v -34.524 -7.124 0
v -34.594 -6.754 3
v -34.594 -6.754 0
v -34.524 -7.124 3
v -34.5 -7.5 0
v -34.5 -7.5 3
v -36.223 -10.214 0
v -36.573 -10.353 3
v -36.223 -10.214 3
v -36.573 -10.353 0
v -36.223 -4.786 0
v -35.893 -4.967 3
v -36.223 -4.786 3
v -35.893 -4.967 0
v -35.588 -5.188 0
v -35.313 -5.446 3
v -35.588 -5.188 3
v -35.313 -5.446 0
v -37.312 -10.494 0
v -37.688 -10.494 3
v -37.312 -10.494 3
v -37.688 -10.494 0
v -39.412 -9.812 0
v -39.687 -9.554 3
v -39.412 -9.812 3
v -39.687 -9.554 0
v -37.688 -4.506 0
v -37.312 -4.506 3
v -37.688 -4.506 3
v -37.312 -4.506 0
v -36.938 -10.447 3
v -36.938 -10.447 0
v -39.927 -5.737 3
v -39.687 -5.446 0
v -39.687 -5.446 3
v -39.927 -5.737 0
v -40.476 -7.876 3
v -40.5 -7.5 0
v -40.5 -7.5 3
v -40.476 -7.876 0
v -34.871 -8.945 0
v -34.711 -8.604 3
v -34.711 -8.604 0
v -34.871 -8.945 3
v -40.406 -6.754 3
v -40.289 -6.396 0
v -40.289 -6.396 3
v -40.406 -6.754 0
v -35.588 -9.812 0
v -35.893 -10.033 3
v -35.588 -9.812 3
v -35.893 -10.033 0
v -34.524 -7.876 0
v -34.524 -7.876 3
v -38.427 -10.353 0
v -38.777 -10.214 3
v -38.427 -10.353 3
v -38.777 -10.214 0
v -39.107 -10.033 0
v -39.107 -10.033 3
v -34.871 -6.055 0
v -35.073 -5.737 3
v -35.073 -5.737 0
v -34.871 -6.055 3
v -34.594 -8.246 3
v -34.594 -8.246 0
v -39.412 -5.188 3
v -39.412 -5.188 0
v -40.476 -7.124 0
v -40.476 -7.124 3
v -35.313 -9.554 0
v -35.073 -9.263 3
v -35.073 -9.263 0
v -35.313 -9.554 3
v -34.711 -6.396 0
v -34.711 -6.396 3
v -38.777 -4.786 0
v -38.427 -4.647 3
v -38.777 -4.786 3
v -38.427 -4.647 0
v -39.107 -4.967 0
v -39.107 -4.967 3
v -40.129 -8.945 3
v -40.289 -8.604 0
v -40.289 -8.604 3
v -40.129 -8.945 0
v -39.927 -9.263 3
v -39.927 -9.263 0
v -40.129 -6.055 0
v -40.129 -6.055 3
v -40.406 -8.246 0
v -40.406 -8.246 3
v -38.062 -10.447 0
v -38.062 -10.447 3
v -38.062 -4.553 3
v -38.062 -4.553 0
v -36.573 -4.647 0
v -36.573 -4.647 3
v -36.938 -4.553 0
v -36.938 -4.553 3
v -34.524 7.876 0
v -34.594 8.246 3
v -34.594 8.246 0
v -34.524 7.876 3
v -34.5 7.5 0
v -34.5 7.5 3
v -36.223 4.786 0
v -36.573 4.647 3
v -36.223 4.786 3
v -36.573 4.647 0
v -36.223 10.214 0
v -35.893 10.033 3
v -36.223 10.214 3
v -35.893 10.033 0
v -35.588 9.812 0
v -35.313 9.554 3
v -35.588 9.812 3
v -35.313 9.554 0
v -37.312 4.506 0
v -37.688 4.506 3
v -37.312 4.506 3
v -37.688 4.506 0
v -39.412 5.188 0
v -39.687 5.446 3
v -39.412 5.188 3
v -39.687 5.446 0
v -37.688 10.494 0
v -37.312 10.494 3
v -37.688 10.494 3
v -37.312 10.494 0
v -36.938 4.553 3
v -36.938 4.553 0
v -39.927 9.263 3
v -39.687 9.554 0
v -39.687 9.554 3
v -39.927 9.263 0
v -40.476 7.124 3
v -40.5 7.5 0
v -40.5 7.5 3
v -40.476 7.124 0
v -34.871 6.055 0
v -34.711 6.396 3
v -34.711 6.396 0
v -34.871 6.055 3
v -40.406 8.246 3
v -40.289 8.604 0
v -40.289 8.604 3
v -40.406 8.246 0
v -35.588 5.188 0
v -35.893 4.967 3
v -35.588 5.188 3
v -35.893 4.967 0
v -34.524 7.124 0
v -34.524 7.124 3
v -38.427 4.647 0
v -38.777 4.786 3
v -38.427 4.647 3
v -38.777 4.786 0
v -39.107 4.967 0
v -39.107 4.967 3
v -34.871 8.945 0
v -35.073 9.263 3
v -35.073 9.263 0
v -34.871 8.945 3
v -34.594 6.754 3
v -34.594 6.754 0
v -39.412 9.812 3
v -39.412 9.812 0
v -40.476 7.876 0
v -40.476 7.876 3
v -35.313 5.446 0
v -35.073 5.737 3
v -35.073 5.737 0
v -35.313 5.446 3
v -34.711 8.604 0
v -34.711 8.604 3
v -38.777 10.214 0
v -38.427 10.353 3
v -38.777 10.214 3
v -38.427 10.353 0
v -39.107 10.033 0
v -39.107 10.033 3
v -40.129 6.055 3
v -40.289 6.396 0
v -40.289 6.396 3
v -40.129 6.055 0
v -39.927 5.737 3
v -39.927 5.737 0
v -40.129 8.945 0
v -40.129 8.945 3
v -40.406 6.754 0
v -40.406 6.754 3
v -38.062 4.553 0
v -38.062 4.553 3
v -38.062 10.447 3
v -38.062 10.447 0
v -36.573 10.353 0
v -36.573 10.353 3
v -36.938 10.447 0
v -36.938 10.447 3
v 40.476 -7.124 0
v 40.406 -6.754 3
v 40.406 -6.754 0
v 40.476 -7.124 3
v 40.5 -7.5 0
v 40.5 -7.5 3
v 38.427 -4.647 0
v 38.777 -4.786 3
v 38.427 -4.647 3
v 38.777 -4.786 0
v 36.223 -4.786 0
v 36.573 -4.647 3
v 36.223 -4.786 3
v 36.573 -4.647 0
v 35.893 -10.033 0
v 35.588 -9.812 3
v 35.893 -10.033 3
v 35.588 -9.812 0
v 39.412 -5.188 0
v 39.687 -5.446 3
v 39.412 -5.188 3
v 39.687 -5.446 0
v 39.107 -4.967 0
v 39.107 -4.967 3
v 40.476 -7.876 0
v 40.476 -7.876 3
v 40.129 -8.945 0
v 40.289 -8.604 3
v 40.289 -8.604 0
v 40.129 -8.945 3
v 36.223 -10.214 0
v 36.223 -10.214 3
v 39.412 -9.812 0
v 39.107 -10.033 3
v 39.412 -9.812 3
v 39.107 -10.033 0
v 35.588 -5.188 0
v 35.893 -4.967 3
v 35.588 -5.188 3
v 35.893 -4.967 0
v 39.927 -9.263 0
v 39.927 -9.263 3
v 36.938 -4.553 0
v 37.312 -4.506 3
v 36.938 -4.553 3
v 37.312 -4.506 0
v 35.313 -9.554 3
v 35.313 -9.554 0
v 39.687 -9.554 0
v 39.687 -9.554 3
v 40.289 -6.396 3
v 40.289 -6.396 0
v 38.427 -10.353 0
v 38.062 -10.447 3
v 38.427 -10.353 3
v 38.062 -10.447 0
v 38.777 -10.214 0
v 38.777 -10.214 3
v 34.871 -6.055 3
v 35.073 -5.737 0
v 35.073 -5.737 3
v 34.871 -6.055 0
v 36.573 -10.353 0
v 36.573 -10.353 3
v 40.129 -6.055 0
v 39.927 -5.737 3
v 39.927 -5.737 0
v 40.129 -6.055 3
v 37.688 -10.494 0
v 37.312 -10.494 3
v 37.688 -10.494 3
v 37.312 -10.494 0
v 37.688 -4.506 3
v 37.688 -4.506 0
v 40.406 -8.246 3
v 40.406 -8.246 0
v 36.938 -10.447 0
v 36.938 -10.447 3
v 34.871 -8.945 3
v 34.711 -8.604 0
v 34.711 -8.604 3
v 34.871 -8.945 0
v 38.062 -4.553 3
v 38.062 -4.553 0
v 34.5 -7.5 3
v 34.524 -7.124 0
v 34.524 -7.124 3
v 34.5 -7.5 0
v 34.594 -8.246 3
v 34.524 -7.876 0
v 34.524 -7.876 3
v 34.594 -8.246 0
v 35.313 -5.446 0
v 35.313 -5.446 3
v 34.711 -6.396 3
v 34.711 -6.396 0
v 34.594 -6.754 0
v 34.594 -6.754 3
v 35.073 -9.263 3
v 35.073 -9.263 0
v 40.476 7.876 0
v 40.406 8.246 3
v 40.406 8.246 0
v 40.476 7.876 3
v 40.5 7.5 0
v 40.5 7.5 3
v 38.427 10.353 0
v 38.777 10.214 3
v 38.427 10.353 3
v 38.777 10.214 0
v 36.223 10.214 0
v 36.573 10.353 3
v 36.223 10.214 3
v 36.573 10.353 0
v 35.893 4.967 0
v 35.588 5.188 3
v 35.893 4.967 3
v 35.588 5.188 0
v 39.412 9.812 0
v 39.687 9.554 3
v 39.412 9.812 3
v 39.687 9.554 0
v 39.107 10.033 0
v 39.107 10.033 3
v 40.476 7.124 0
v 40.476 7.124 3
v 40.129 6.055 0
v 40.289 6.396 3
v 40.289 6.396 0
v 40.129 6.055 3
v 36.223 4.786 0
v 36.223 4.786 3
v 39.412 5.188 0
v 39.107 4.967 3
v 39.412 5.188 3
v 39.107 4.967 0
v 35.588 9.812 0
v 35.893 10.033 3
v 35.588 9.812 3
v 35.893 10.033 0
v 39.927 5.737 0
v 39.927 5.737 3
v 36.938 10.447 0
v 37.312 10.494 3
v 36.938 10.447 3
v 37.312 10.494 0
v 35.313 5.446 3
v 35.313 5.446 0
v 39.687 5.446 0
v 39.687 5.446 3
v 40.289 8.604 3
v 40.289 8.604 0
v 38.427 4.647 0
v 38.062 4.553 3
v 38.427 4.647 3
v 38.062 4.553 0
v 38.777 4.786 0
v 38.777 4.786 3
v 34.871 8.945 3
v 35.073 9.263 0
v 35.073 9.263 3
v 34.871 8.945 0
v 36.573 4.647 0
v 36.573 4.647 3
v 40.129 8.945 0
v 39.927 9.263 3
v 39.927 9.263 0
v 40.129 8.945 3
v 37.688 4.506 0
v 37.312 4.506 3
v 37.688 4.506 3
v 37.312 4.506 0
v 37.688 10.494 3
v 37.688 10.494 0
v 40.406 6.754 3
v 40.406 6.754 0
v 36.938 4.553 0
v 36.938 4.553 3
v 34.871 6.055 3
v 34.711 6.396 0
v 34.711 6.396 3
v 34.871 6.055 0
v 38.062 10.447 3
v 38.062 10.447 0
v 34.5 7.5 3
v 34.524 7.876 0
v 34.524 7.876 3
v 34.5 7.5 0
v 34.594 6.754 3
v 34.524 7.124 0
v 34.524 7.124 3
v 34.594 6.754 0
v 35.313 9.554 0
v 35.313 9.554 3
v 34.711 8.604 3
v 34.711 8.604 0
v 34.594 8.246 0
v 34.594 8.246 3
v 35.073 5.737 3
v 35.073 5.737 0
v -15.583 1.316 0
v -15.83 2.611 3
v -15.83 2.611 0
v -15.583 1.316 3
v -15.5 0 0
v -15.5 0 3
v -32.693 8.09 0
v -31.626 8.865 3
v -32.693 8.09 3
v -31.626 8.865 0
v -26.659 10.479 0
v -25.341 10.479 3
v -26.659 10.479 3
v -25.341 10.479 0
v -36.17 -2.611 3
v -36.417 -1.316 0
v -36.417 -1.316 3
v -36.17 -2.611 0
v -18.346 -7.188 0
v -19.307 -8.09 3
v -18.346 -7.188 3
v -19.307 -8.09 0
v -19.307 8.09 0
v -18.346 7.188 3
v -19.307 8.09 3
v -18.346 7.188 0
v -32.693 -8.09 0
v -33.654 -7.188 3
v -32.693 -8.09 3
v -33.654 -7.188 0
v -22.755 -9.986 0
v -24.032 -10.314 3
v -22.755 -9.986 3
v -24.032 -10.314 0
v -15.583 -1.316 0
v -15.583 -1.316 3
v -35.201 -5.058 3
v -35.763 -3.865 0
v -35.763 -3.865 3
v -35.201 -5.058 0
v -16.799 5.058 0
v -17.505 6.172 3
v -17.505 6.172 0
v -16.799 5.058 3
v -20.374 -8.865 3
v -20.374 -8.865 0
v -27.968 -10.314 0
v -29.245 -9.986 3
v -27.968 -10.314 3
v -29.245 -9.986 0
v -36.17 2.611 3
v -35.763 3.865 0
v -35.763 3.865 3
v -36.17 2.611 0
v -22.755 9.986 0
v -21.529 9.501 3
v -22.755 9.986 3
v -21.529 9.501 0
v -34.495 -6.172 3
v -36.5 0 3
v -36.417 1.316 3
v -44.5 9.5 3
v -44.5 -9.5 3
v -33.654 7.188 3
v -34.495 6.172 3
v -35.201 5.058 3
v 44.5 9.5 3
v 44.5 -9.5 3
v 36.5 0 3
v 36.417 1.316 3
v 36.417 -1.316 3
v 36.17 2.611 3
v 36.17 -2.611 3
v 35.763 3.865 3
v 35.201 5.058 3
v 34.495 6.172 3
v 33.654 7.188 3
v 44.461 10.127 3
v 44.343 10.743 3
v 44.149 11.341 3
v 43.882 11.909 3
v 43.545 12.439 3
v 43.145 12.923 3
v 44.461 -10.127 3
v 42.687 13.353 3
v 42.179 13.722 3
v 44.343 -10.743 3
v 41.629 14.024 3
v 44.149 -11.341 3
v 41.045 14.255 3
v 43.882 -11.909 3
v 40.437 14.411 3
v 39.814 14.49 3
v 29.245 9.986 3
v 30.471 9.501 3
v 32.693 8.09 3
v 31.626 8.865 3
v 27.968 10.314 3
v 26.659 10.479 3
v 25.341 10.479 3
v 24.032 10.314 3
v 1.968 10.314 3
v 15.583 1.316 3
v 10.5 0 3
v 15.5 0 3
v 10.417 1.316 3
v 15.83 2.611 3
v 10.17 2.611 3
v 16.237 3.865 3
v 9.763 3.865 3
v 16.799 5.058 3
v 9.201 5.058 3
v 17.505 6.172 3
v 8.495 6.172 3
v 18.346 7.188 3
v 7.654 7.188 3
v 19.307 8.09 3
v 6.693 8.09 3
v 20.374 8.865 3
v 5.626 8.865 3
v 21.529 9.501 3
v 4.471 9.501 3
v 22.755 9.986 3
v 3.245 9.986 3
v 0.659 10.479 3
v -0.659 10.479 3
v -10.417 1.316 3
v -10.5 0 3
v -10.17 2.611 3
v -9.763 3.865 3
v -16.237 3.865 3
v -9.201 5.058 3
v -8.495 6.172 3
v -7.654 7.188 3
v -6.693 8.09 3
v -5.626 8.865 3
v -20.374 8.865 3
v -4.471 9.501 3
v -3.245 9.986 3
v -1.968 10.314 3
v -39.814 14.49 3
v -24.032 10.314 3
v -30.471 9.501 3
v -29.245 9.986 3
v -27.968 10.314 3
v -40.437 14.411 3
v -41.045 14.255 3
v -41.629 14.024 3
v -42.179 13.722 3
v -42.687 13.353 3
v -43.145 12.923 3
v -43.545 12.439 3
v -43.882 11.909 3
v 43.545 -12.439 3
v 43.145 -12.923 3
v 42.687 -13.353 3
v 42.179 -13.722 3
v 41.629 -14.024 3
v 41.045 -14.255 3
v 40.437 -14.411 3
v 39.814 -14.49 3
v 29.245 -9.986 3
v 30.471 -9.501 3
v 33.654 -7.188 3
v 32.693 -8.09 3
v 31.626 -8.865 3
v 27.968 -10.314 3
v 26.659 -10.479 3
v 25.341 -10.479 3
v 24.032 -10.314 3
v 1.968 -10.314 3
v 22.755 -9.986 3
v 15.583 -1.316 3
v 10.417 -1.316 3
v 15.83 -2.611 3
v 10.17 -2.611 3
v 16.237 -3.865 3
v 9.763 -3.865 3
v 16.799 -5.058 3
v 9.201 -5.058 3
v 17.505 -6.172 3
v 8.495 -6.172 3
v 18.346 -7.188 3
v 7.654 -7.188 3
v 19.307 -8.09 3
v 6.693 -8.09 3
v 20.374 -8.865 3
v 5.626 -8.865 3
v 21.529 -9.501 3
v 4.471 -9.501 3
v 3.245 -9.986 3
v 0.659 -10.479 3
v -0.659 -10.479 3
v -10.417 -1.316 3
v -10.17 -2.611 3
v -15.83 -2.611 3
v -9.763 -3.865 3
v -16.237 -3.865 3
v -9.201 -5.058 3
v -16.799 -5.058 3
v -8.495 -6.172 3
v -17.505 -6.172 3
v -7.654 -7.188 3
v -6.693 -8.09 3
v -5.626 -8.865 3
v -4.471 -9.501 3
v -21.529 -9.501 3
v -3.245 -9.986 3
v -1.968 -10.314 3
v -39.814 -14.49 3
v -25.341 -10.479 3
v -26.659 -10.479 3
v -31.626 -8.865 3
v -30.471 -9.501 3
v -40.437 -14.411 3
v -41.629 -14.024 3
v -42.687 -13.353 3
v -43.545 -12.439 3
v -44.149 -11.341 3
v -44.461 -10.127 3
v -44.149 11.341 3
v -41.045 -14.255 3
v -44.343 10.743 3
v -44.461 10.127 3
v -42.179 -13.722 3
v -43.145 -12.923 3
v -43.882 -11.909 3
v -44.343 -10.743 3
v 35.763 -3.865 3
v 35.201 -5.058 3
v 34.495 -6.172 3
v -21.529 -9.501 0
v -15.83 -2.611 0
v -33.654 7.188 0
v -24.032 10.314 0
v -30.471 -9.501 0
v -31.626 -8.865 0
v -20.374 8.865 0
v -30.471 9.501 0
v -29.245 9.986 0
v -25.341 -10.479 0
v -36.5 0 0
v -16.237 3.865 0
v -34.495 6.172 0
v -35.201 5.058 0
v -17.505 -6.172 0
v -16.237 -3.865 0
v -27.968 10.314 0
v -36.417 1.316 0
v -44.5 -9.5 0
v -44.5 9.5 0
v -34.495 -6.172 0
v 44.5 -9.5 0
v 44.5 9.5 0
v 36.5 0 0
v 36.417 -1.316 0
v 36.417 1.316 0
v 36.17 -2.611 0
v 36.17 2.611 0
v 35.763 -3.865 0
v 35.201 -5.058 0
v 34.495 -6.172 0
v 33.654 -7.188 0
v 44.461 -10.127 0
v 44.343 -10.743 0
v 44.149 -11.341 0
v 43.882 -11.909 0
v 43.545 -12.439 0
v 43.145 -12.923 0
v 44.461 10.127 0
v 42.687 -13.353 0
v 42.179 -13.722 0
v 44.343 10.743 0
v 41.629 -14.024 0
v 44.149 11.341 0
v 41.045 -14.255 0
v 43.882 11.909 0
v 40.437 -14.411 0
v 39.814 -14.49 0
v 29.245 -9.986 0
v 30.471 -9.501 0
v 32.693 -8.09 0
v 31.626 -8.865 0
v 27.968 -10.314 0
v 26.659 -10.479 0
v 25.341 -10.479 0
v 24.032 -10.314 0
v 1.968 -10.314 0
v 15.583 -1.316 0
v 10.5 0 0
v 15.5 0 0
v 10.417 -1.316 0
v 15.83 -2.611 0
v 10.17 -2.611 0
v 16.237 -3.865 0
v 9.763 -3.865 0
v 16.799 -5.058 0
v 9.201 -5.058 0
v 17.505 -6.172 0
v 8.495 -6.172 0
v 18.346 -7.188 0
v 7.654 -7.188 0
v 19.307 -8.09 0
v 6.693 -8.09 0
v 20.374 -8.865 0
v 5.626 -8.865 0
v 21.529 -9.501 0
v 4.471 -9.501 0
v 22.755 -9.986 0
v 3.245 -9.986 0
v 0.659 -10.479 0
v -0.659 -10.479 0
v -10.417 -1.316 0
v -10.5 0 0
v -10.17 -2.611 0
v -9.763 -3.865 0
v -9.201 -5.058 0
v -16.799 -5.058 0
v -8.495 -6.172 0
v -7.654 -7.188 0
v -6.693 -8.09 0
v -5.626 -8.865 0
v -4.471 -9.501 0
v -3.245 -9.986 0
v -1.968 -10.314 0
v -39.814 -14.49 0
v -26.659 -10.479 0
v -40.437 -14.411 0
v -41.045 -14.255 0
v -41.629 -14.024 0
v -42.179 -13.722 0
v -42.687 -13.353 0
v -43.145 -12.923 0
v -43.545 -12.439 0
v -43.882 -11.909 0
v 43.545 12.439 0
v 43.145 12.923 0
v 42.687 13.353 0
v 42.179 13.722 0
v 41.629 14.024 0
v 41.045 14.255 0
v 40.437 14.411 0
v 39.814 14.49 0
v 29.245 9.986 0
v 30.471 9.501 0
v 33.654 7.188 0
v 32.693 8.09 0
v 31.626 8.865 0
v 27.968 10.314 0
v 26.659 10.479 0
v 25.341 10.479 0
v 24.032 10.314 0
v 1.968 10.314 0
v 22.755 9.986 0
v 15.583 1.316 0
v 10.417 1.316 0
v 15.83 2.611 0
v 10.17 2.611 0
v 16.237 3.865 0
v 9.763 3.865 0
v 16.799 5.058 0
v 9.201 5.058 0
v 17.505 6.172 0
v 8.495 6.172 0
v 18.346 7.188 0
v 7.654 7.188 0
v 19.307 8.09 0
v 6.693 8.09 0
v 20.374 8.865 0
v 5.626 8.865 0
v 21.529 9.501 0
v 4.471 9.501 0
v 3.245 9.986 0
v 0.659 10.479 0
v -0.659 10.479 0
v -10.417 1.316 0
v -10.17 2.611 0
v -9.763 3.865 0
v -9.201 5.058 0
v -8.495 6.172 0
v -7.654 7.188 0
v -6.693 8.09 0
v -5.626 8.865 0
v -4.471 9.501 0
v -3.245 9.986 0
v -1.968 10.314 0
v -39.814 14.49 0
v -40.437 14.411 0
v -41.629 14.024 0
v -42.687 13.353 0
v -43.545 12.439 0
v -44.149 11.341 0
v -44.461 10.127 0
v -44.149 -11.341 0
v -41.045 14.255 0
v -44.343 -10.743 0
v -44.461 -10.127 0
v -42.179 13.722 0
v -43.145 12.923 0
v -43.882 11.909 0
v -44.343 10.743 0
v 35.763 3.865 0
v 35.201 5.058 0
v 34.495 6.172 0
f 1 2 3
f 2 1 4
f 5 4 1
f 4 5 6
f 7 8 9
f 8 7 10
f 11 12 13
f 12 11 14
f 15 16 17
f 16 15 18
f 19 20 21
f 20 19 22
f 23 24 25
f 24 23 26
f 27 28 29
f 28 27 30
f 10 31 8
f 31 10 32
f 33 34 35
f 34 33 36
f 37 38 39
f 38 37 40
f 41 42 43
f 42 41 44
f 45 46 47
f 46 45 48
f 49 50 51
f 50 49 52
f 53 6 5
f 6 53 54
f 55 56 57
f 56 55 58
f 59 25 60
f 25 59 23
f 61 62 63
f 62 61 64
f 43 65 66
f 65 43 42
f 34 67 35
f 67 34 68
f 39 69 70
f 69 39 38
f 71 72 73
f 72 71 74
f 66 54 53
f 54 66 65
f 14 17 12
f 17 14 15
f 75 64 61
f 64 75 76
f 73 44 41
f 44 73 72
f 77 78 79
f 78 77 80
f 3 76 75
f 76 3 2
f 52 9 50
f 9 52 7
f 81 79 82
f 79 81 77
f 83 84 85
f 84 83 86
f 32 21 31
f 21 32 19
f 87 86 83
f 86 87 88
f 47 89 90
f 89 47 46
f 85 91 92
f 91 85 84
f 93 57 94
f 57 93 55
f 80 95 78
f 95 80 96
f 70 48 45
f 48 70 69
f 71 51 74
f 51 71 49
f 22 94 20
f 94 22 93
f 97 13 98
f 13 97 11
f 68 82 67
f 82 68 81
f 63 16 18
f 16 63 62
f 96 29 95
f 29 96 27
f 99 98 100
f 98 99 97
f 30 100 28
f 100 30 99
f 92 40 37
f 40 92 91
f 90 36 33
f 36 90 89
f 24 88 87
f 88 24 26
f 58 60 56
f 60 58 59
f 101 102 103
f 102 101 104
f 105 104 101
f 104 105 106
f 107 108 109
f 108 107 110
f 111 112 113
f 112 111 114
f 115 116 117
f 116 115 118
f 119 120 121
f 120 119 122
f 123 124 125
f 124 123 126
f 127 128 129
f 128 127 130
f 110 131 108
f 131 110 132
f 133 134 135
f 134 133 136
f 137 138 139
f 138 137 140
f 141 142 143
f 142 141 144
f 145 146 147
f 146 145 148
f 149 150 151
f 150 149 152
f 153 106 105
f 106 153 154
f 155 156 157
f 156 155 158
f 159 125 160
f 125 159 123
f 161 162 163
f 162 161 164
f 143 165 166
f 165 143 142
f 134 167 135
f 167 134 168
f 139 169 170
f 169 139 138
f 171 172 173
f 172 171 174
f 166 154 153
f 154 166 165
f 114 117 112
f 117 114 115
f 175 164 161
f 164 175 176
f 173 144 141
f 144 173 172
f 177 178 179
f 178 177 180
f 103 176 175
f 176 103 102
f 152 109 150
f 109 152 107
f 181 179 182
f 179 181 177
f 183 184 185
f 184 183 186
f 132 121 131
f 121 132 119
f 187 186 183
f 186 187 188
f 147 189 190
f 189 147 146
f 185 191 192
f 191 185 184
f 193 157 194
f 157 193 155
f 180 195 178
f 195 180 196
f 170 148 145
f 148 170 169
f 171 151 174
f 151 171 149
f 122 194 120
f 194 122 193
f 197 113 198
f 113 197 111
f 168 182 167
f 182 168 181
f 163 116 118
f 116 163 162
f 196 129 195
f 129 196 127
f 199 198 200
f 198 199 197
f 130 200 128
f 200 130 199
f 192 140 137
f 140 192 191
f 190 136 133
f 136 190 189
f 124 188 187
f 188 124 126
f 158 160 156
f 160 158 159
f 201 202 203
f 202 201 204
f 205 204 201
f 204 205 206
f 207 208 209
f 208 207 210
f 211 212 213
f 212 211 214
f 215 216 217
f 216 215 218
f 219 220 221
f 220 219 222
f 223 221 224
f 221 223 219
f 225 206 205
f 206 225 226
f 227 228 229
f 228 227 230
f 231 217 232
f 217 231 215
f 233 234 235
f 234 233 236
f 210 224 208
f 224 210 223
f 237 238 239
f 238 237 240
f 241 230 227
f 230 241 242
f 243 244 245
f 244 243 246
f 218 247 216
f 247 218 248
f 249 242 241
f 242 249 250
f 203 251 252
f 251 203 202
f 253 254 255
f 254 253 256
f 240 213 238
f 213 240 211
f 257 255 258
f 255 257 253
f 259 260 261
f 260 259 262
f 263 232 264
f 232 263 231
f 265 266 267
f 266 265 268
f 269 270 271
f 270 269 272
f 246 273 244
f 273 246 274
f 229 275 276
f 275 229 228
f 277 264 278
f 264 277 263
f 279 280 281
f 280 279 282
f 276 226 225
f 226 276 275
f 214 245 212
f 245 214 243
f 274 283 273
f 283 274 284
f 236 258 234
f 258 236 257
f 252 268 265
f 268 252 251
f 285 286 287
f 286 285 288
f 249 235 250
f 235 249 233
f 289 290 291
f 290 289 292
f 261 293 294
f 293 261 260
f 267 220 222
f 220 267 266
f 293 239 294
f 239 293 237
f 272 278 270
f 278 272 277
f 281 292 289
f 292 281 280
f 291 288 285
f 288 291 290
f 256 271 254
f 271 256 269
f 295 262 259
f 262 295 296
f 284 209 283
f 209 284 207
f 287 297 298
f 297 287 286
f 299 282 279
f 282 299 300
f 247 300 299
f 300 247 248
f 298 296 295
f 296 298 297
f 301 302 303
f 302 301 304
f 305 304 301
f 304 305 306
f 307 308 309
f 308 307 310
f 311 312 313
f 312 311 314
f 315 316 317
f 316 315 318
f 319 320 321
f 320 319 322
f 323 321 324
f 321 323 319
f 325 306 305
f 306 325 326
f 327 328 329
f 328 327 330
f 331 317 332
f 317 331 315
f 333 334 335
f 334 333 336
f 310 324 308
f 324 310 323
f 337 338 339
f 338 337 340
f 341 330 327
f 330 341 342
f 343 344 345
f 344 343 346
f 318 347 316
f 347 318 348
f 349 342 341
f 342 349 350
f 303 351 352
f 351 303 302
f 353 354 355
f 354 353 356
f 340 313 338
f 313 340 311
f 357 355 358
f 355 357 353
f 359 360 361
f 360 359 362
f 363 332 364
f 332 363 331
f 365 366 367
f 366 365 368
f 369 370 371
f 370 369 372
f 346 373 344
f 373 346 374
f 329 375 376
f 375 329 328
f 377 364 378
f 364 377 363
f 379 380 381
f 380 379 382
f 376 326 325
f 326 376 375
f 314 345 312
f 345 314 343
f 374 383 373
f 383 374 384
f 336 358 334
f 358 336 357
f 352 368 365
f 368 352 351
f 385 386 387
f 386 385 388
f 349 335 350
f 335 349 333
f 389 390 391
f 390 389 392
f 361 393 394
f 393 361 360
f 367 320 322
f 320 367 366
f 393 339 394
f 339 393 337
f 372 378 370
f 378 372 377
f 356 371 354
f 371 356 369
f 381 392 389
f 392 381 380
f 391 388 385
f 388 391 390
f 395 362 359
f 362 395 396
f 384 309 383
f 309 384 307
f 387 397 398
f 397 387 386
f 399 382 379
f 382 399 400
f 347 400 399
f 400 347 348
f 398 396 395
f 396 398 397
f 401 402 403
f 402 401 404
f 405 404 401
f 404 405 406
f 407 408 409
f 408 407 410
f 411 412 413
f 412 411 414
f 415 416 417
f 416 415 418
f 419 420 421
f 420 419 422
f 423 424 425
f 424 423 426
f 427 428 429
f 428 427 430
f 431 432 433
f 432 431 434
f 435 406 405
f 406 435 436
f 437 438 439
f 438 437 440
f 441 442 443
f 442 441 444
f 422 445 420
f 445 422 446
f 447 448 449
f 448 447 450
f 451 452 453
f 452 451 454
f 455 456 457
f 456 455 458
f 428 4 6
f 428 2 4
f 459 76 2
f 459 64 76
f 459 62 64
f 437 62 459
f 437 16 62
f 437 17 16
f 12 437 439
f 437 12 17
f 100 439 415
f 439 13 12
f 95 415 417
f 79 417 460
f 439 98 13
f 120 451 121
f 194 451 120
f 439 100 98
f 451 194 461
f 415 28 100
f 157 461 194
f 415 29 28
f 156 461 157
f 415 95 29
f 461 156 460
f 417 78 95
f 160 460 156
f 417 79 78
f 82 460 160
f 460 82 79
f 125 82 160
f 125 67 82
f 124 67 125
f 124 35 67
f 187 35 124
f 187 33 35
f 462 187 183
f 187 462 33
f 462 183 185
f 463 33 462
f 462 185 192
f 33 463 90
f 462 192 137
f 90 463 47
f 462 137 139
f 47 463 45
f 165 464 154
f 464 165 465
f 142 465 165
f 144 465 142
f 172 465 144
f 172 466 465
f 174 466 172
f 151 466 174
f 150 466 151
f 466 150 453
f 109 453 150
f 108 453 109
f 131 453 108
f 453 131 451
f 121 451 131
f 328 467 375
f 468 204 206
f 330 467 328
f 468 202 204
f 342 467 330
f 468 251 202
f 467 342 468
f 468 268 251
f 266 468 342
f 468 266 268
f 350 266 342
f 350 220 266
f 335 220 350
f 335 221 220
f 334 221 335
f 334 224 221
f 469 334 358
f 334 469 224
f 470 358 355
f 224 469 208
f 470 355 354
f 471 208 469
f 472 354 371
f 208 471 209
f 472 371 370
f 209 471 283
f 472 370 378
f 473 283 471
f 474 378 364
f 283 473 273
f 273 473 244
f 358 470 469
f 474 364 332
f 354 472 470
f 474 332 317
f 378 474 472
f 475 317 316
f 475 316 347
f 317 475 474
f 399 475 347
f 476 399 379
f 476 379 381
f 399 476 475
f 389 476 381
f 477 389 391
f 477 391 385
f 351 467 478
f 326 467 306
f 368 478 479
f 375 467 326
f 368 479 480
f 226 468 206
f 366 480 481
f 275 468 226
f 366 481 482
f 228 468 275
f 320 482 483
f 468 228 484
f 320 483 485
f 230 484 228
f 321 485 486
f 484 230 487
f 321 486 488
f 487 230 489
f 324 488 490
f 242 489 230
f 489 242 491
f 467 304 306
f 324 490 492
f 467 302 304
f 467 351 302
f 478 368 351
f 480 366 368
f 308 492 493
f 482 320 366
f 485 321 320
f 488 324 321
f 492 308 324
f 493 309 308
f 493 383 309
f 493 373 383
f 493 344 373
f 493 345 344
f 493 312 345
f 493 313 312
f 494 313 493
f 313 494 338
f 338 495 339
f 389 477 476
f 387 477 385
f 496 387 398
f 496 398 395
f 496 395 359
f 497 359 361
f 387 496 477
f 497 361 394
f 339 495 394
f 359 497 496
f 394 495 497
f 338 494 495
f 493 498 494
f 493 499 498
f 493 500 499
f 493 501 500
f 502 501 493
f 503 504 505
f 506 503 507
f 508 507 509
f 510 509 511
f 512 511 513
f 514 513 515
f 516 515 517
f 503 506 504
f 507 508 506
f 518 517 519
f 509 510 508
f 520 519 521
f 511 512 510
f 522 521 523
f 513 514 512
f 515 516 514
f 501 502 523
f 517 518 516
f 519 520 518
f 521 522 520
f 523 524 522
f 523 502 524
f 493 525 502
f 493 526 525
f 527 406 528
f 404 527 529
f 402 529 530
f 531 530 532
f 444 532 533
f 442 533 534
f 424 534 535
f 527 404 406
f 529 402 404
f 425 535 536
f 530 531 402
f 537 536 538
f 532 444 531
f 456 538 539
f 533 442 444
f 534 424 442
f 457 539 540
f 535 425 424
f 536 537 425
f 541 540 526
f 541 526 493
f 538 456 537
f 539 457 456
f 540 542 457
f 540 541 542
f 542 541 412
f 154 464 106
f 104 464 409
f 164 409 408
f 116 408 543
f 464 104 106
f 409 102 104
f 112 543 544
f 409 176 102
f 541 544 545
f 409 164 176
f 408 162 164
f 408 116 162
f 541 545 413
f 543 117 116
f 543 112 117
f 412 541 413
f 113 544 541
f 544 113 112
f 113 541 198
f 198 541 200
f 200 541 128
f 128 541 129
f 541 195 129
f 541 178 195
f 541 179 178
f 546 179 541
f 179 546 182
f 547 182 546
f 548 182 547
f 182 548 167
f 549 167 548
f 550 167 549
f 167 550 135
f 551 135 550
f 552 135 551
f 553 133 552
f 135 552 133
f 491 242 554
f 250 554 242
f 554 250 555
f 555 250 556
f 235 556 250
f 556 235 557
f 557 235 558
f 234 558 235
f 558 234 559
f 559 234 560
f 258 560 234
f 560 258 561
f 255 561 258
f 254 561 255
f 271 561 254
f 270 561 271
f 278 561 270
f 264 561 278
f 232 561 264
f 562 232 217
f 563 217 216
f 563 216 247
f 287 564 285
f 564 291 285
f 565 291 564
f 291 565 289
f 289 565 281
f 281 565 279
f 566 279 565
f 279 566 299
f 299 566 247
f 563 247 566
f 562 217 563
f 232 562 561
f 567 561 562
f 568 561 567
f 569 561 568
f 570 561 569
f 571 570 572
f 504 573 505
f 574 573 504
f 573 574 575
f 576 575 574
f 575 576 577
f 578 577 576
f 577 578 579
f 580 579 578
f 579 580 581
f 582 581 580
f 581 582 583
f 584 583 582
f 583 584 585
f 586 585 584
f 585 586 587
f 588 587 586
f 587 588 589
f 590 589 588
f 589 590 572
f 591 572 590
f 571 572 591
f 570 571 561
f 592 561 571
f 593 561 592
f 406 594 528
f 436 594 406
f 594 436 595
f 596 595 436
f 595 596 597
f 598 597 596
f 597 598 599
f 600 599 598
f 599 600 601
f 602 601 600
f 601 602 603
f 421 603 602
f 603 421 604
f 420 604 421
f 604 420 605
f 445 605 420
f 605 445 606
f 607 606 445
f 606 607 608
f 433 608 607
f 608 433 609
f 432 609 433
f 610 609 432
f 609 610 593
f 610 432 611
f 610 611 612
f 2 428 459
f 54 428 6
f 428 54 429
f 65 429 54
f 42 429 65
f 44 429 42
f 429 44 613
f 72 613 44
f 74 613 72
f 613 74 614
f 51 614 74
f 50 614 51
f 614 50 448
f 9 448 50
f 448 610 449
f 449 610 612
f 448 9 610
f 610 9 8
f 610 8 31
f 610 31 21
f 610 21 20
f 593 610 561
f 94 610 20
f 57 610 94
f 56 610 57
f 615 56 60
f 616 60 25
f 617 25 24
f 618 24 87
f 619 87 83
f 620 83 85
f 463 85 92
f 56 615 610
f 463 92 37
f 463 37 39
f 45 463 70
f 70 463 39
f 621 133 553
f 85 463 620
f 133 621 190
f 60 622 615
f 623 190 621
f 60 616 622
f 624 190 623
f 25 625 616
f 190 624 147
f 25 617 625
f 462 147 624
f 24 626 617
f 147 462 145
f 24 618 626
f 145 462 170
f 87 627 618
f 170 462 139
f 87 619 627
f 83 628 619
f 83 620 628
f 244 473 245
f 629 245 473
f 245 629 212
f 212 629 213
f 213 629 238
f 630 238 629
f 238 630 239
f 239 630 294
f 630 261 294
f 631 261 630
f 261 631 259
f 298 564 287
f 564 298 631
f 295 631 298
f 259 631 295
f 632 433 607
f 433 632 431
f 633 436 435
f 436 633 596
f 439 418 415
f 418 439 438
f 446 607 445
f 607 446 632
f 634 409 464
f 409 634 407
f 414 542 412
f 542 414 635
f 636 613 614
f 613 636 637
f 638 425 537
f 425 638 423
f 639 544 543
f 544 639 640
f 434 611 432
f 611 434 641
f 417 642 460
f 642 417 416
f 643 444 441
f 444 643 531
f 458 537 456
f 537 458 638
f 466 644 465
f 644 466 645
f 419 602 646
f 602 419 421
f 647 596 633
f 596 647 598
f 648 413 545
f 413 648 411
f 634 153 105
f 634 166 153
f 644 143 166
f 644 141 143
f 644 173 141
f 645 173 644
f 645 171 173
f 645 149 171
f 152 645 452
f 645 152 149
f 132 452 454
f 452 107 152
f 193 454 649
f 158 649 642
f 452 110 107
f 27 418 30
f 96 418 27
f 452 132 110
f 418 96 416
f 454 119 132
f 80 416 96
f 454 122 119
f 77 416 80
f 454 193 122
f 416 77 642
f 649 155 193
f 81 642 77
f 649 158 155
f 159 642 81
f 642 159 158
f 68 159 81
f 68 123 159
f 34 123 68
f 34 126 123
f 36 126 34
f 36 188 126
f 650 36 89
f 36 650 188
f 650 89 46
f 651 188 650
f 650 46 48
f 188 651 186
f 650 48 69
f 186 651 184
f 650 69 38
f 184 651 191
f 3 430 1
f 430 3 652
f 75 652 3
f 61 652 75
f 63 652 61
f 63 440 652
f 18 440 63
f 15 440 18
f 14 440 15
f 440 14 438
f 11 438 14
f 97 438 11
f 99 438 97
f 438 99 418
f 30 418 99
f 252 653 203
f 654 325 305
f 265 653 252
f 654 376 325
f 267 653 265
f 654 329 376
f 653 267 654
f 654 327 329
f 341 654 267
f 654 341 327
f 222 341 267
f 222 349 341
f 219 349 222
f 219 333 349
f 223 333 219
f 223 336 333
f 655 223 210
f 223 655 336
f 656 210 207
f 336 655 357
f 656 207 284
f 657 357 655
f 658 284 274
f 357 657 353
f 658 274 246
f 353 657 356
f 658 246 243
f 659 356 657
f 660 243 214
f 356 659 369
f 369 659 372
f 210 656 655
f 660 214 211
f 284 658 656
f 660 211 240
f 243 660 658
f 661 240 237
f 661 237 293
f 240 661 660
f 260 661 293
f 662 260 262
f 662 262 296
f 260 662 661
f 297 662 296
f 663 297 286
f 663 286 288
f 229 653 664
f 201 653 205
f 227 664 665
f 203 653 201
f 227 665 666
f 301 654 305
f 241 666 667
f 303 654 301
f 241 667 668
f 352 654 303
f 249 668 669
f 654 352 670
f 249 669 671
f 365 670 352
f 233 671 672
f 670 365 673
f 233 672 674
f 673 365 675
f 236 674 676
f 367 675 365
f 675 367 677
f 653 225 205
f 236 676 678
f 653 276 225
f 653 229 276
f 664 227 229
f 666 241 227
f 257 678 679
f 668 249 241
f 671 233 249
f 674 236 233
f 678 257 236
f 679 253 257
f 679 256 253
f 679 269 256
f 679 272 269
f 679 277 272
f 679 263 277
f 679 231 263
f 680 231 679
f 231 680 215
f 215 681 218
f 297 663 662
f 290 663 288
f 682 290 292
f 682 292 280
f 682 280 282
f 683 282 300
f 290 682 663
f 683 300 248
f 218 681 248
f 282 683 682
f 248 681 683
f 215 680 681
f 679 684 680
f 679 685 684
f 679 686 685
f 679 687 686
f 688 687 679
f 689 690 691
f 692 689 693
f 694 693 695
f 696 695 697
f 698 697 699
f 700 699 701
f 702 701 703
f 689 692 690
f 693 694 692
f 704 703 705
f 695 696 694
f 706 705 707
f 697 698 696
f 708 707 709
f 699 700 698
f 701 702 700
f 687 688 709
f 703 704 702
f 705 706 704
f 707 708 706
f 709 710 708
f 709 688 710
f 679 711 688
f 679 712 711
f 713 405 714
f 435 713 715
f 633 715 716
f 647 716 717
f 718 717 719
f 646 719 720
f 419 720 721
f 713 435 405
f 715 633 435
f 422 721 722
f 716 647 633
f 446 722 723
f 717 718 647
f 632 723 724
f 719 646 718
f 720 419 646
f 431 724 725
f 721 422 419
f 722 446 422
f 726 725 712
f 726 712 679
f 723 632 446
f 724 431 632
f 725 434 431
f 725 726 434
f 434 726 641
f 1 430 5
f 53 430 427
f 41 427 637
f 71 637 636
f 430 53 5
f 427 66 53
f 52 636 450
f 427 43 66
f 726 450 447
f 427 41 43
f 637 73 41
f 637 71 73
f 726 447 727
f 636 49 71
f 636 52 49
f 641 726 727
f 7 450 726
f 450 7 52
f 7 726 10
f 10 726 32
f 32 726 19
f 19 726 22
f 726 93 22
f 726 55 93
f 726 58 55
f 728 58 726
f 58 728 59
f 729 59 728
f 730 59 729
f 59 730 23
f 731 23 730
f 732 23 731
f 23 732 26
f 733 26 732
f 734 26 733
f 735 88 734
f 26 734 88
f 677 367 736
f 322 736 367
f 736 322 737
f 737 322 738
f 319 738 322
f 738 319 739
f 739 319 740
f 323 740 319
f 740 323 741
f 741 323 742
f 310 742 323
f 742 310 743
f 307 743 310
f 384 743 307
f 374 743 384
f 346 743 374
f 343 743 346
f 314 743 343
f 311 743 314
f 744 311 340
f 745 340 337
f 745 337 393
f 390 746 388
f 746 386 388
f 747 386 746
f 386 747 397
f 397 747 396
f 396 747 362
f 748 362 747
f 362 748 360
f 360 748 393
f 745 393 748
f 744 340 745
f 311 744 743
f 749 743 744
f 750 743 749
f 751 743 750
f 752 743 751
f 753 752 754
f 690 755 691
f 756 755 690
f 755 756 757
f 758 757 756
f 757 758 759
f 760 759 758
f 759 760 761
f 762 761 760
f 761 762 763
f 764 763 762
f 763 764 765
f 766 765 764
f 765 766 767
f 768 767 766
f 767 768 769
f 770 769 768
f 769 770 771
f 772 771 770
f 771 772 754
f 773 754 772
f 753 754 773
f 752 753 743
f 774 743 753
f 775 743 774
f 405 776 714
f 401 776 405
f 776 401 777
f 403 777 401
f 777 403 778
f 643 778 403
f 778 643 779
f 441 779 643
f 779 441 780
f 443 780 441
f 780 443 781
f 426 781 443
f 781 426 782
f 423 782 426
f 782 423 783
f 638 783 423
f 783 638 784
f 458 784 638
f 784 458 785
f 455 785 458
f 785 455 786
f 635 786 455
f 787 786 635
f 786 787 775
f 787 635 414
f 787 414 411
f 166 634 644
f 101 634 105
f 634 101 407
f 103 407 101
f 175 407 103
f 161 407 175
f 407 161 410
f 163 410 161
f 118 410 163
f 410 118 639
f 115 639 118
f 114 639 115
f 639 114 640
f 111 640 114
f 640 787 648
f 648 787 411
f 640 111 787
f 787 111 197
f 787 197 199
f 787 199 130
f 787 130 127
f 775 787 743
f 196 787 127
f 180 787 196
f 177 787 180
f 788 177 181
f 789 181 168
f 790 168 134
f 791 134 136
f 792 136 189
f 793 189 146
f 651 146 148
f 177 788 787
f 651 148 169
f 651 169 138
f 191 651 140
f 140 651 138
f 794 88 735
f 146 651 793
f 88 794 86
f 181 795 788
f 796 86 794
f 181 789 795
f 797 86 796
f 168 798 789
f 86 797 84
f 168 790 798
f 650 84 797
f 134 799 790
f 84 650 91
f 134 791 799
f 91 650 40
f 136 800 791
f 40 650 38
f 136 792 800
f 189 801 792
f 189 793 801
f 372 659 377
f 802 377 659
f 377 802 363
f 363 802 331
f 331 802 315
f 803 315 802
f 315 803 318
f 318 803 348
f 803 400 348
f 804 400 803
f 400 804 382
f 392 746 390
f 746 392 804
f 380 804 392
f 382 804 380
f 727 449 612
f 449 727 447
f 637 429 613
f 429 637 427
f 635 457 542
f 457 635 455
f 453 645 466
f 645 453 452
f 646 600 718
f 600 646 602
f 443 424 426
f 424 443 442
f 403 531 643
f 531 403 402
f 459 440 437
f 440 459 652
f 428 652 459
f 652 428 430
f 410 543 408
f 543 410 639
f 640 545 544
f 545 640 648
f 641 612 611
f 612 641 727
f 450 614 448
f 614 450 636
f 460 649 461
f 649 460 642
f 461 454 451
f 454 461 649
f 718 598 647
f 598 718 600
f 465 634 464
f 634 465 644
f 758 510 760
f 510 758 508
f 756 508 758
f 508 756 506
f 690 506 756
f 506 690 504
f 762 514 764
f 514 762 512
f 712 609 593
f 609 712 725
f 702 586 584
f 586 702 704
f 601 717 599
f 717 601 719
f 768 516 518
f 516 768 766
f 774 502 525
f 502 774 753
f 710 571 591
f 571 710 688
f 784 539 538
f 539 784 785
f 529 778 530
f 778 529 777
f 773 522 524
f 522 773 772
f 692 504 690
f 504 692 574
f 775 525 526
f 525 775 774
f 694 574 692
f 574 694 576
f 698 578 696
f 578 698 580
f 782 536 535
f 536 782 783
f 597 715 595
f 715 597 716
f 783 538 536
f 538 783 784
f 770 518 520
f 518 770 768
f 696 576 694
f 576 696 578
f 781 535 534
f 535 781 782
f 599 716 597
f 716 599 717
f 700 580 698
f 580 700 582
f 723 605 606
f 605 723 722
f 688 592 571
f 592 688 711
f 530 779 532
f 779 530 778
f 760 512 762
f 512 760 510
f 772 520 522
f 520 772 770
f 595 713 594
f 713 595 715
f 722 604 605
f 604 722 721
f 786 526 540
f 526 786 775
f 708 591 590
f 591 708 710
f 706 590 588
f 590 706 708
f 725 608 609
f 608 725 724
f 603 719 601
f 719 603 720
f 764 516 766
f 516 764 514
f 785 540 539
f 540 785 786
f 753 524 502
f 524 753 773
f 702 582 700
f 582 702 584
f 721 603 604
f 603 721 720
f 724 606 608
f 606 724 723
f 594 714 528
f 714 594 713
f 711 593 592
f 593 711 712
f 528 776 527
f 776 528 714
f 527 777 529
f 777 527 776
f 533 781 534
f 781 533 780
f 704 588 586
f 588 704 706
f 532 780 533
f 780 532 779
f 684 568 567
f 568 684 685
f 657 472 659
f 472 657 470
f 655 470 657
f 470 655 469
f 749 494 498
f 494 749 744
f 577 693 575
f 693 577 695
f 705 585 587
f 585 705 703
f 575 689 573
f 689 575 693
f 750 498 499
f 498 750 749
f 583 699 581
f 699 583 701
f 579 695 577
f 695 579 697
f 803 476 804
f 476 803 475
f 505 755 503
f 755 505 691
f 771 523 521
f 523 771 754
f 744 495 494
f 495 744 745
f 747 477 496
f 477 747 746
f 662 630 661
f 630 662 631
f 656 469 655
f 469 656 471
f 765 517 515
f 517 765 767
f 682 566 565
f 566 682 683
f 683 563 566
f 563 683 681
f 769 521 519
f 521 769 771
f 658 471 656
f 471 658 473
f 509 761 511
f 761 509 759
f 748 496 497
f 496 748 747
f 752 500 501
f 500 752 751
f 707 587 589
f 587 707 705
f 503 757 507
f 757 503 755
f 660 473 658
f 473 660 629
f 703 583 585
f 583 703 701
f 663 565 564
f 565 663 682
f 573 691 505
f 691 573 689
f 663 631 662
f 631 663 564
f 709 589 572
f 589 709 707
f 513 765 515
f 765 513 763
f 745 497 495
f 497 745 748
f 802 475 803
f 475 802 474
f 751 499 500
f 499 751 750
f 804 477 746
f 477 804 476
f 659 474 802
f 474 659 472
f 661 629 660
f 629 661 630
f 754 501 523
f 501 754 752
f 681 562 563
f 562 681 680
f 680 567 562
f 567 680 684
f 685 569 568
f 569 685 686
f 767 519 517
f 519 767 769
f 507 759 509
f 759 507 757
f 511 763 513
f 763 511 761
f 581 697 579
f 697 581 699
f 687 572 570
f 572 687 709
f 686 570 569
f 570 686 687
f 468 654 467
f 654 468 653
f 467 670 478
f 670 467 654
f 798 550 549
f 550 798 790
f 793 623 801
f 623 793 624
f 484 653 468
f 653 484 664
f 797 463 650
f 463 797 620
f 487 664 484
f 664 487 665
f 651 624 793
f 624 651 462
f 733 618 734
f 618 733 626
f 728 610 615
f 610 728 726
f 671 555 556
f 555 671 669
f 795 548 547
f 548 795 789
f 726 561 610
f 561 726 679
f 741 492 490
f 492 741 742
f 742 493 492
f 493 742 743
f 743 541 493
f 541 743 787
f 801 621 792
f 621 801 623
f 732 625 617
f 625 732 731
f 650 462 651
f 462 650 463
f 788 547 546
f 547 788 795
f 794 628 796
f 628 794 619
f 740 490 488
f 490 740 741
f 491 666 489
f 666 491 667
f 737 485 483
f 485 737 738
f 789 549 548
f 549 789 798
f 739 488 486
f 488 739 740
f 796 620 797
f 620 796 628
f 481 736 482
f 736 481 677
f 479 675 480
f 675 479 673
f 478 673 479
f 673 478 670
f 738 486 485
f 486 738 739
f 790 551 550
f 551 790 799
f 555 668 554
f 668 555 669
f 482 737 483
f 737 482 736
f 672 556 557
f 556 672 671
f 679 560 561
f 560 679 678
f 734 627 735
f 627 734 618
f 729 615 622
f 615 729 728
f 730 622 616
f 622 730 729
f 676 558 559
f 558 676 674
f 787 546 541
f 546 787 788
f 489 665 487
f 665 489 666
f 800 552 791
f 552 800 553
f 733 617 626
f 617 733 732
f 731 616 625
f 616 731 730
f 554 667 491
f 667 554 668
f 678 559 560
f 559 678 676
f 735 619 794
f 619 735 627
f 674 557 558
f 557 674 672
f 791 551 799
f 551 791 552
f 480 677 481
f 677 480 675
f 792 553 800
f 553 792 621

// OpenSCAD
$fn = 50;


difference() {
	union() {
		hull() {
			translate(v = [-39.5000000000, 9.5000000000, 0]) {
				cylinder(h = 3, r = 5);
			}
			translate(v = [39.5000000000, 9.5000000000, 0]) {
				cylinder(h = 3, r = 5);
			}
			translate(v = [-39.5000000000, -9.5000000000, 0]) {
				cylinder(h = 3, r = 5);
			}
			translate(v = [39.5000000000, -9.5000000000, 0]) {
				cylinder(h = 3, r = 5);
			}
		}
	}
	union() {
		#translate(v = [-37.5000000000, -7.5000000000, -100.0000000000]) {
			cylinder(h = 200, r = 3.0000000000);
		}
		#translate(v = [-37.5000000000, 7.5000000000, -100.0000000000]) {
			cylinder(h = 200, r = 3.0000000000);
		}
		#translate(v = [37.5000000000, -7.5000000000, -100.0000000000]) {
			cylinder(h = 200, r = 3.0000000000);
		}
		#translate(v = [37.5000000000, 7.5000000000, -100.0000000000]) {
			cylinder(h = 200, r = 3.0000000000);
		}
		#translate(v = [-26.0000000000, 0, 0]) {
			cylinder(h = 3, r = 10.5000000000);
		}
		#cylinder(h = 3, r = 10.5000000000);
		#translate(v = [26.0000000000, 0, 0]) {
			cylinder(h = 3, r = 10.5000000000);
		}
	}
}
